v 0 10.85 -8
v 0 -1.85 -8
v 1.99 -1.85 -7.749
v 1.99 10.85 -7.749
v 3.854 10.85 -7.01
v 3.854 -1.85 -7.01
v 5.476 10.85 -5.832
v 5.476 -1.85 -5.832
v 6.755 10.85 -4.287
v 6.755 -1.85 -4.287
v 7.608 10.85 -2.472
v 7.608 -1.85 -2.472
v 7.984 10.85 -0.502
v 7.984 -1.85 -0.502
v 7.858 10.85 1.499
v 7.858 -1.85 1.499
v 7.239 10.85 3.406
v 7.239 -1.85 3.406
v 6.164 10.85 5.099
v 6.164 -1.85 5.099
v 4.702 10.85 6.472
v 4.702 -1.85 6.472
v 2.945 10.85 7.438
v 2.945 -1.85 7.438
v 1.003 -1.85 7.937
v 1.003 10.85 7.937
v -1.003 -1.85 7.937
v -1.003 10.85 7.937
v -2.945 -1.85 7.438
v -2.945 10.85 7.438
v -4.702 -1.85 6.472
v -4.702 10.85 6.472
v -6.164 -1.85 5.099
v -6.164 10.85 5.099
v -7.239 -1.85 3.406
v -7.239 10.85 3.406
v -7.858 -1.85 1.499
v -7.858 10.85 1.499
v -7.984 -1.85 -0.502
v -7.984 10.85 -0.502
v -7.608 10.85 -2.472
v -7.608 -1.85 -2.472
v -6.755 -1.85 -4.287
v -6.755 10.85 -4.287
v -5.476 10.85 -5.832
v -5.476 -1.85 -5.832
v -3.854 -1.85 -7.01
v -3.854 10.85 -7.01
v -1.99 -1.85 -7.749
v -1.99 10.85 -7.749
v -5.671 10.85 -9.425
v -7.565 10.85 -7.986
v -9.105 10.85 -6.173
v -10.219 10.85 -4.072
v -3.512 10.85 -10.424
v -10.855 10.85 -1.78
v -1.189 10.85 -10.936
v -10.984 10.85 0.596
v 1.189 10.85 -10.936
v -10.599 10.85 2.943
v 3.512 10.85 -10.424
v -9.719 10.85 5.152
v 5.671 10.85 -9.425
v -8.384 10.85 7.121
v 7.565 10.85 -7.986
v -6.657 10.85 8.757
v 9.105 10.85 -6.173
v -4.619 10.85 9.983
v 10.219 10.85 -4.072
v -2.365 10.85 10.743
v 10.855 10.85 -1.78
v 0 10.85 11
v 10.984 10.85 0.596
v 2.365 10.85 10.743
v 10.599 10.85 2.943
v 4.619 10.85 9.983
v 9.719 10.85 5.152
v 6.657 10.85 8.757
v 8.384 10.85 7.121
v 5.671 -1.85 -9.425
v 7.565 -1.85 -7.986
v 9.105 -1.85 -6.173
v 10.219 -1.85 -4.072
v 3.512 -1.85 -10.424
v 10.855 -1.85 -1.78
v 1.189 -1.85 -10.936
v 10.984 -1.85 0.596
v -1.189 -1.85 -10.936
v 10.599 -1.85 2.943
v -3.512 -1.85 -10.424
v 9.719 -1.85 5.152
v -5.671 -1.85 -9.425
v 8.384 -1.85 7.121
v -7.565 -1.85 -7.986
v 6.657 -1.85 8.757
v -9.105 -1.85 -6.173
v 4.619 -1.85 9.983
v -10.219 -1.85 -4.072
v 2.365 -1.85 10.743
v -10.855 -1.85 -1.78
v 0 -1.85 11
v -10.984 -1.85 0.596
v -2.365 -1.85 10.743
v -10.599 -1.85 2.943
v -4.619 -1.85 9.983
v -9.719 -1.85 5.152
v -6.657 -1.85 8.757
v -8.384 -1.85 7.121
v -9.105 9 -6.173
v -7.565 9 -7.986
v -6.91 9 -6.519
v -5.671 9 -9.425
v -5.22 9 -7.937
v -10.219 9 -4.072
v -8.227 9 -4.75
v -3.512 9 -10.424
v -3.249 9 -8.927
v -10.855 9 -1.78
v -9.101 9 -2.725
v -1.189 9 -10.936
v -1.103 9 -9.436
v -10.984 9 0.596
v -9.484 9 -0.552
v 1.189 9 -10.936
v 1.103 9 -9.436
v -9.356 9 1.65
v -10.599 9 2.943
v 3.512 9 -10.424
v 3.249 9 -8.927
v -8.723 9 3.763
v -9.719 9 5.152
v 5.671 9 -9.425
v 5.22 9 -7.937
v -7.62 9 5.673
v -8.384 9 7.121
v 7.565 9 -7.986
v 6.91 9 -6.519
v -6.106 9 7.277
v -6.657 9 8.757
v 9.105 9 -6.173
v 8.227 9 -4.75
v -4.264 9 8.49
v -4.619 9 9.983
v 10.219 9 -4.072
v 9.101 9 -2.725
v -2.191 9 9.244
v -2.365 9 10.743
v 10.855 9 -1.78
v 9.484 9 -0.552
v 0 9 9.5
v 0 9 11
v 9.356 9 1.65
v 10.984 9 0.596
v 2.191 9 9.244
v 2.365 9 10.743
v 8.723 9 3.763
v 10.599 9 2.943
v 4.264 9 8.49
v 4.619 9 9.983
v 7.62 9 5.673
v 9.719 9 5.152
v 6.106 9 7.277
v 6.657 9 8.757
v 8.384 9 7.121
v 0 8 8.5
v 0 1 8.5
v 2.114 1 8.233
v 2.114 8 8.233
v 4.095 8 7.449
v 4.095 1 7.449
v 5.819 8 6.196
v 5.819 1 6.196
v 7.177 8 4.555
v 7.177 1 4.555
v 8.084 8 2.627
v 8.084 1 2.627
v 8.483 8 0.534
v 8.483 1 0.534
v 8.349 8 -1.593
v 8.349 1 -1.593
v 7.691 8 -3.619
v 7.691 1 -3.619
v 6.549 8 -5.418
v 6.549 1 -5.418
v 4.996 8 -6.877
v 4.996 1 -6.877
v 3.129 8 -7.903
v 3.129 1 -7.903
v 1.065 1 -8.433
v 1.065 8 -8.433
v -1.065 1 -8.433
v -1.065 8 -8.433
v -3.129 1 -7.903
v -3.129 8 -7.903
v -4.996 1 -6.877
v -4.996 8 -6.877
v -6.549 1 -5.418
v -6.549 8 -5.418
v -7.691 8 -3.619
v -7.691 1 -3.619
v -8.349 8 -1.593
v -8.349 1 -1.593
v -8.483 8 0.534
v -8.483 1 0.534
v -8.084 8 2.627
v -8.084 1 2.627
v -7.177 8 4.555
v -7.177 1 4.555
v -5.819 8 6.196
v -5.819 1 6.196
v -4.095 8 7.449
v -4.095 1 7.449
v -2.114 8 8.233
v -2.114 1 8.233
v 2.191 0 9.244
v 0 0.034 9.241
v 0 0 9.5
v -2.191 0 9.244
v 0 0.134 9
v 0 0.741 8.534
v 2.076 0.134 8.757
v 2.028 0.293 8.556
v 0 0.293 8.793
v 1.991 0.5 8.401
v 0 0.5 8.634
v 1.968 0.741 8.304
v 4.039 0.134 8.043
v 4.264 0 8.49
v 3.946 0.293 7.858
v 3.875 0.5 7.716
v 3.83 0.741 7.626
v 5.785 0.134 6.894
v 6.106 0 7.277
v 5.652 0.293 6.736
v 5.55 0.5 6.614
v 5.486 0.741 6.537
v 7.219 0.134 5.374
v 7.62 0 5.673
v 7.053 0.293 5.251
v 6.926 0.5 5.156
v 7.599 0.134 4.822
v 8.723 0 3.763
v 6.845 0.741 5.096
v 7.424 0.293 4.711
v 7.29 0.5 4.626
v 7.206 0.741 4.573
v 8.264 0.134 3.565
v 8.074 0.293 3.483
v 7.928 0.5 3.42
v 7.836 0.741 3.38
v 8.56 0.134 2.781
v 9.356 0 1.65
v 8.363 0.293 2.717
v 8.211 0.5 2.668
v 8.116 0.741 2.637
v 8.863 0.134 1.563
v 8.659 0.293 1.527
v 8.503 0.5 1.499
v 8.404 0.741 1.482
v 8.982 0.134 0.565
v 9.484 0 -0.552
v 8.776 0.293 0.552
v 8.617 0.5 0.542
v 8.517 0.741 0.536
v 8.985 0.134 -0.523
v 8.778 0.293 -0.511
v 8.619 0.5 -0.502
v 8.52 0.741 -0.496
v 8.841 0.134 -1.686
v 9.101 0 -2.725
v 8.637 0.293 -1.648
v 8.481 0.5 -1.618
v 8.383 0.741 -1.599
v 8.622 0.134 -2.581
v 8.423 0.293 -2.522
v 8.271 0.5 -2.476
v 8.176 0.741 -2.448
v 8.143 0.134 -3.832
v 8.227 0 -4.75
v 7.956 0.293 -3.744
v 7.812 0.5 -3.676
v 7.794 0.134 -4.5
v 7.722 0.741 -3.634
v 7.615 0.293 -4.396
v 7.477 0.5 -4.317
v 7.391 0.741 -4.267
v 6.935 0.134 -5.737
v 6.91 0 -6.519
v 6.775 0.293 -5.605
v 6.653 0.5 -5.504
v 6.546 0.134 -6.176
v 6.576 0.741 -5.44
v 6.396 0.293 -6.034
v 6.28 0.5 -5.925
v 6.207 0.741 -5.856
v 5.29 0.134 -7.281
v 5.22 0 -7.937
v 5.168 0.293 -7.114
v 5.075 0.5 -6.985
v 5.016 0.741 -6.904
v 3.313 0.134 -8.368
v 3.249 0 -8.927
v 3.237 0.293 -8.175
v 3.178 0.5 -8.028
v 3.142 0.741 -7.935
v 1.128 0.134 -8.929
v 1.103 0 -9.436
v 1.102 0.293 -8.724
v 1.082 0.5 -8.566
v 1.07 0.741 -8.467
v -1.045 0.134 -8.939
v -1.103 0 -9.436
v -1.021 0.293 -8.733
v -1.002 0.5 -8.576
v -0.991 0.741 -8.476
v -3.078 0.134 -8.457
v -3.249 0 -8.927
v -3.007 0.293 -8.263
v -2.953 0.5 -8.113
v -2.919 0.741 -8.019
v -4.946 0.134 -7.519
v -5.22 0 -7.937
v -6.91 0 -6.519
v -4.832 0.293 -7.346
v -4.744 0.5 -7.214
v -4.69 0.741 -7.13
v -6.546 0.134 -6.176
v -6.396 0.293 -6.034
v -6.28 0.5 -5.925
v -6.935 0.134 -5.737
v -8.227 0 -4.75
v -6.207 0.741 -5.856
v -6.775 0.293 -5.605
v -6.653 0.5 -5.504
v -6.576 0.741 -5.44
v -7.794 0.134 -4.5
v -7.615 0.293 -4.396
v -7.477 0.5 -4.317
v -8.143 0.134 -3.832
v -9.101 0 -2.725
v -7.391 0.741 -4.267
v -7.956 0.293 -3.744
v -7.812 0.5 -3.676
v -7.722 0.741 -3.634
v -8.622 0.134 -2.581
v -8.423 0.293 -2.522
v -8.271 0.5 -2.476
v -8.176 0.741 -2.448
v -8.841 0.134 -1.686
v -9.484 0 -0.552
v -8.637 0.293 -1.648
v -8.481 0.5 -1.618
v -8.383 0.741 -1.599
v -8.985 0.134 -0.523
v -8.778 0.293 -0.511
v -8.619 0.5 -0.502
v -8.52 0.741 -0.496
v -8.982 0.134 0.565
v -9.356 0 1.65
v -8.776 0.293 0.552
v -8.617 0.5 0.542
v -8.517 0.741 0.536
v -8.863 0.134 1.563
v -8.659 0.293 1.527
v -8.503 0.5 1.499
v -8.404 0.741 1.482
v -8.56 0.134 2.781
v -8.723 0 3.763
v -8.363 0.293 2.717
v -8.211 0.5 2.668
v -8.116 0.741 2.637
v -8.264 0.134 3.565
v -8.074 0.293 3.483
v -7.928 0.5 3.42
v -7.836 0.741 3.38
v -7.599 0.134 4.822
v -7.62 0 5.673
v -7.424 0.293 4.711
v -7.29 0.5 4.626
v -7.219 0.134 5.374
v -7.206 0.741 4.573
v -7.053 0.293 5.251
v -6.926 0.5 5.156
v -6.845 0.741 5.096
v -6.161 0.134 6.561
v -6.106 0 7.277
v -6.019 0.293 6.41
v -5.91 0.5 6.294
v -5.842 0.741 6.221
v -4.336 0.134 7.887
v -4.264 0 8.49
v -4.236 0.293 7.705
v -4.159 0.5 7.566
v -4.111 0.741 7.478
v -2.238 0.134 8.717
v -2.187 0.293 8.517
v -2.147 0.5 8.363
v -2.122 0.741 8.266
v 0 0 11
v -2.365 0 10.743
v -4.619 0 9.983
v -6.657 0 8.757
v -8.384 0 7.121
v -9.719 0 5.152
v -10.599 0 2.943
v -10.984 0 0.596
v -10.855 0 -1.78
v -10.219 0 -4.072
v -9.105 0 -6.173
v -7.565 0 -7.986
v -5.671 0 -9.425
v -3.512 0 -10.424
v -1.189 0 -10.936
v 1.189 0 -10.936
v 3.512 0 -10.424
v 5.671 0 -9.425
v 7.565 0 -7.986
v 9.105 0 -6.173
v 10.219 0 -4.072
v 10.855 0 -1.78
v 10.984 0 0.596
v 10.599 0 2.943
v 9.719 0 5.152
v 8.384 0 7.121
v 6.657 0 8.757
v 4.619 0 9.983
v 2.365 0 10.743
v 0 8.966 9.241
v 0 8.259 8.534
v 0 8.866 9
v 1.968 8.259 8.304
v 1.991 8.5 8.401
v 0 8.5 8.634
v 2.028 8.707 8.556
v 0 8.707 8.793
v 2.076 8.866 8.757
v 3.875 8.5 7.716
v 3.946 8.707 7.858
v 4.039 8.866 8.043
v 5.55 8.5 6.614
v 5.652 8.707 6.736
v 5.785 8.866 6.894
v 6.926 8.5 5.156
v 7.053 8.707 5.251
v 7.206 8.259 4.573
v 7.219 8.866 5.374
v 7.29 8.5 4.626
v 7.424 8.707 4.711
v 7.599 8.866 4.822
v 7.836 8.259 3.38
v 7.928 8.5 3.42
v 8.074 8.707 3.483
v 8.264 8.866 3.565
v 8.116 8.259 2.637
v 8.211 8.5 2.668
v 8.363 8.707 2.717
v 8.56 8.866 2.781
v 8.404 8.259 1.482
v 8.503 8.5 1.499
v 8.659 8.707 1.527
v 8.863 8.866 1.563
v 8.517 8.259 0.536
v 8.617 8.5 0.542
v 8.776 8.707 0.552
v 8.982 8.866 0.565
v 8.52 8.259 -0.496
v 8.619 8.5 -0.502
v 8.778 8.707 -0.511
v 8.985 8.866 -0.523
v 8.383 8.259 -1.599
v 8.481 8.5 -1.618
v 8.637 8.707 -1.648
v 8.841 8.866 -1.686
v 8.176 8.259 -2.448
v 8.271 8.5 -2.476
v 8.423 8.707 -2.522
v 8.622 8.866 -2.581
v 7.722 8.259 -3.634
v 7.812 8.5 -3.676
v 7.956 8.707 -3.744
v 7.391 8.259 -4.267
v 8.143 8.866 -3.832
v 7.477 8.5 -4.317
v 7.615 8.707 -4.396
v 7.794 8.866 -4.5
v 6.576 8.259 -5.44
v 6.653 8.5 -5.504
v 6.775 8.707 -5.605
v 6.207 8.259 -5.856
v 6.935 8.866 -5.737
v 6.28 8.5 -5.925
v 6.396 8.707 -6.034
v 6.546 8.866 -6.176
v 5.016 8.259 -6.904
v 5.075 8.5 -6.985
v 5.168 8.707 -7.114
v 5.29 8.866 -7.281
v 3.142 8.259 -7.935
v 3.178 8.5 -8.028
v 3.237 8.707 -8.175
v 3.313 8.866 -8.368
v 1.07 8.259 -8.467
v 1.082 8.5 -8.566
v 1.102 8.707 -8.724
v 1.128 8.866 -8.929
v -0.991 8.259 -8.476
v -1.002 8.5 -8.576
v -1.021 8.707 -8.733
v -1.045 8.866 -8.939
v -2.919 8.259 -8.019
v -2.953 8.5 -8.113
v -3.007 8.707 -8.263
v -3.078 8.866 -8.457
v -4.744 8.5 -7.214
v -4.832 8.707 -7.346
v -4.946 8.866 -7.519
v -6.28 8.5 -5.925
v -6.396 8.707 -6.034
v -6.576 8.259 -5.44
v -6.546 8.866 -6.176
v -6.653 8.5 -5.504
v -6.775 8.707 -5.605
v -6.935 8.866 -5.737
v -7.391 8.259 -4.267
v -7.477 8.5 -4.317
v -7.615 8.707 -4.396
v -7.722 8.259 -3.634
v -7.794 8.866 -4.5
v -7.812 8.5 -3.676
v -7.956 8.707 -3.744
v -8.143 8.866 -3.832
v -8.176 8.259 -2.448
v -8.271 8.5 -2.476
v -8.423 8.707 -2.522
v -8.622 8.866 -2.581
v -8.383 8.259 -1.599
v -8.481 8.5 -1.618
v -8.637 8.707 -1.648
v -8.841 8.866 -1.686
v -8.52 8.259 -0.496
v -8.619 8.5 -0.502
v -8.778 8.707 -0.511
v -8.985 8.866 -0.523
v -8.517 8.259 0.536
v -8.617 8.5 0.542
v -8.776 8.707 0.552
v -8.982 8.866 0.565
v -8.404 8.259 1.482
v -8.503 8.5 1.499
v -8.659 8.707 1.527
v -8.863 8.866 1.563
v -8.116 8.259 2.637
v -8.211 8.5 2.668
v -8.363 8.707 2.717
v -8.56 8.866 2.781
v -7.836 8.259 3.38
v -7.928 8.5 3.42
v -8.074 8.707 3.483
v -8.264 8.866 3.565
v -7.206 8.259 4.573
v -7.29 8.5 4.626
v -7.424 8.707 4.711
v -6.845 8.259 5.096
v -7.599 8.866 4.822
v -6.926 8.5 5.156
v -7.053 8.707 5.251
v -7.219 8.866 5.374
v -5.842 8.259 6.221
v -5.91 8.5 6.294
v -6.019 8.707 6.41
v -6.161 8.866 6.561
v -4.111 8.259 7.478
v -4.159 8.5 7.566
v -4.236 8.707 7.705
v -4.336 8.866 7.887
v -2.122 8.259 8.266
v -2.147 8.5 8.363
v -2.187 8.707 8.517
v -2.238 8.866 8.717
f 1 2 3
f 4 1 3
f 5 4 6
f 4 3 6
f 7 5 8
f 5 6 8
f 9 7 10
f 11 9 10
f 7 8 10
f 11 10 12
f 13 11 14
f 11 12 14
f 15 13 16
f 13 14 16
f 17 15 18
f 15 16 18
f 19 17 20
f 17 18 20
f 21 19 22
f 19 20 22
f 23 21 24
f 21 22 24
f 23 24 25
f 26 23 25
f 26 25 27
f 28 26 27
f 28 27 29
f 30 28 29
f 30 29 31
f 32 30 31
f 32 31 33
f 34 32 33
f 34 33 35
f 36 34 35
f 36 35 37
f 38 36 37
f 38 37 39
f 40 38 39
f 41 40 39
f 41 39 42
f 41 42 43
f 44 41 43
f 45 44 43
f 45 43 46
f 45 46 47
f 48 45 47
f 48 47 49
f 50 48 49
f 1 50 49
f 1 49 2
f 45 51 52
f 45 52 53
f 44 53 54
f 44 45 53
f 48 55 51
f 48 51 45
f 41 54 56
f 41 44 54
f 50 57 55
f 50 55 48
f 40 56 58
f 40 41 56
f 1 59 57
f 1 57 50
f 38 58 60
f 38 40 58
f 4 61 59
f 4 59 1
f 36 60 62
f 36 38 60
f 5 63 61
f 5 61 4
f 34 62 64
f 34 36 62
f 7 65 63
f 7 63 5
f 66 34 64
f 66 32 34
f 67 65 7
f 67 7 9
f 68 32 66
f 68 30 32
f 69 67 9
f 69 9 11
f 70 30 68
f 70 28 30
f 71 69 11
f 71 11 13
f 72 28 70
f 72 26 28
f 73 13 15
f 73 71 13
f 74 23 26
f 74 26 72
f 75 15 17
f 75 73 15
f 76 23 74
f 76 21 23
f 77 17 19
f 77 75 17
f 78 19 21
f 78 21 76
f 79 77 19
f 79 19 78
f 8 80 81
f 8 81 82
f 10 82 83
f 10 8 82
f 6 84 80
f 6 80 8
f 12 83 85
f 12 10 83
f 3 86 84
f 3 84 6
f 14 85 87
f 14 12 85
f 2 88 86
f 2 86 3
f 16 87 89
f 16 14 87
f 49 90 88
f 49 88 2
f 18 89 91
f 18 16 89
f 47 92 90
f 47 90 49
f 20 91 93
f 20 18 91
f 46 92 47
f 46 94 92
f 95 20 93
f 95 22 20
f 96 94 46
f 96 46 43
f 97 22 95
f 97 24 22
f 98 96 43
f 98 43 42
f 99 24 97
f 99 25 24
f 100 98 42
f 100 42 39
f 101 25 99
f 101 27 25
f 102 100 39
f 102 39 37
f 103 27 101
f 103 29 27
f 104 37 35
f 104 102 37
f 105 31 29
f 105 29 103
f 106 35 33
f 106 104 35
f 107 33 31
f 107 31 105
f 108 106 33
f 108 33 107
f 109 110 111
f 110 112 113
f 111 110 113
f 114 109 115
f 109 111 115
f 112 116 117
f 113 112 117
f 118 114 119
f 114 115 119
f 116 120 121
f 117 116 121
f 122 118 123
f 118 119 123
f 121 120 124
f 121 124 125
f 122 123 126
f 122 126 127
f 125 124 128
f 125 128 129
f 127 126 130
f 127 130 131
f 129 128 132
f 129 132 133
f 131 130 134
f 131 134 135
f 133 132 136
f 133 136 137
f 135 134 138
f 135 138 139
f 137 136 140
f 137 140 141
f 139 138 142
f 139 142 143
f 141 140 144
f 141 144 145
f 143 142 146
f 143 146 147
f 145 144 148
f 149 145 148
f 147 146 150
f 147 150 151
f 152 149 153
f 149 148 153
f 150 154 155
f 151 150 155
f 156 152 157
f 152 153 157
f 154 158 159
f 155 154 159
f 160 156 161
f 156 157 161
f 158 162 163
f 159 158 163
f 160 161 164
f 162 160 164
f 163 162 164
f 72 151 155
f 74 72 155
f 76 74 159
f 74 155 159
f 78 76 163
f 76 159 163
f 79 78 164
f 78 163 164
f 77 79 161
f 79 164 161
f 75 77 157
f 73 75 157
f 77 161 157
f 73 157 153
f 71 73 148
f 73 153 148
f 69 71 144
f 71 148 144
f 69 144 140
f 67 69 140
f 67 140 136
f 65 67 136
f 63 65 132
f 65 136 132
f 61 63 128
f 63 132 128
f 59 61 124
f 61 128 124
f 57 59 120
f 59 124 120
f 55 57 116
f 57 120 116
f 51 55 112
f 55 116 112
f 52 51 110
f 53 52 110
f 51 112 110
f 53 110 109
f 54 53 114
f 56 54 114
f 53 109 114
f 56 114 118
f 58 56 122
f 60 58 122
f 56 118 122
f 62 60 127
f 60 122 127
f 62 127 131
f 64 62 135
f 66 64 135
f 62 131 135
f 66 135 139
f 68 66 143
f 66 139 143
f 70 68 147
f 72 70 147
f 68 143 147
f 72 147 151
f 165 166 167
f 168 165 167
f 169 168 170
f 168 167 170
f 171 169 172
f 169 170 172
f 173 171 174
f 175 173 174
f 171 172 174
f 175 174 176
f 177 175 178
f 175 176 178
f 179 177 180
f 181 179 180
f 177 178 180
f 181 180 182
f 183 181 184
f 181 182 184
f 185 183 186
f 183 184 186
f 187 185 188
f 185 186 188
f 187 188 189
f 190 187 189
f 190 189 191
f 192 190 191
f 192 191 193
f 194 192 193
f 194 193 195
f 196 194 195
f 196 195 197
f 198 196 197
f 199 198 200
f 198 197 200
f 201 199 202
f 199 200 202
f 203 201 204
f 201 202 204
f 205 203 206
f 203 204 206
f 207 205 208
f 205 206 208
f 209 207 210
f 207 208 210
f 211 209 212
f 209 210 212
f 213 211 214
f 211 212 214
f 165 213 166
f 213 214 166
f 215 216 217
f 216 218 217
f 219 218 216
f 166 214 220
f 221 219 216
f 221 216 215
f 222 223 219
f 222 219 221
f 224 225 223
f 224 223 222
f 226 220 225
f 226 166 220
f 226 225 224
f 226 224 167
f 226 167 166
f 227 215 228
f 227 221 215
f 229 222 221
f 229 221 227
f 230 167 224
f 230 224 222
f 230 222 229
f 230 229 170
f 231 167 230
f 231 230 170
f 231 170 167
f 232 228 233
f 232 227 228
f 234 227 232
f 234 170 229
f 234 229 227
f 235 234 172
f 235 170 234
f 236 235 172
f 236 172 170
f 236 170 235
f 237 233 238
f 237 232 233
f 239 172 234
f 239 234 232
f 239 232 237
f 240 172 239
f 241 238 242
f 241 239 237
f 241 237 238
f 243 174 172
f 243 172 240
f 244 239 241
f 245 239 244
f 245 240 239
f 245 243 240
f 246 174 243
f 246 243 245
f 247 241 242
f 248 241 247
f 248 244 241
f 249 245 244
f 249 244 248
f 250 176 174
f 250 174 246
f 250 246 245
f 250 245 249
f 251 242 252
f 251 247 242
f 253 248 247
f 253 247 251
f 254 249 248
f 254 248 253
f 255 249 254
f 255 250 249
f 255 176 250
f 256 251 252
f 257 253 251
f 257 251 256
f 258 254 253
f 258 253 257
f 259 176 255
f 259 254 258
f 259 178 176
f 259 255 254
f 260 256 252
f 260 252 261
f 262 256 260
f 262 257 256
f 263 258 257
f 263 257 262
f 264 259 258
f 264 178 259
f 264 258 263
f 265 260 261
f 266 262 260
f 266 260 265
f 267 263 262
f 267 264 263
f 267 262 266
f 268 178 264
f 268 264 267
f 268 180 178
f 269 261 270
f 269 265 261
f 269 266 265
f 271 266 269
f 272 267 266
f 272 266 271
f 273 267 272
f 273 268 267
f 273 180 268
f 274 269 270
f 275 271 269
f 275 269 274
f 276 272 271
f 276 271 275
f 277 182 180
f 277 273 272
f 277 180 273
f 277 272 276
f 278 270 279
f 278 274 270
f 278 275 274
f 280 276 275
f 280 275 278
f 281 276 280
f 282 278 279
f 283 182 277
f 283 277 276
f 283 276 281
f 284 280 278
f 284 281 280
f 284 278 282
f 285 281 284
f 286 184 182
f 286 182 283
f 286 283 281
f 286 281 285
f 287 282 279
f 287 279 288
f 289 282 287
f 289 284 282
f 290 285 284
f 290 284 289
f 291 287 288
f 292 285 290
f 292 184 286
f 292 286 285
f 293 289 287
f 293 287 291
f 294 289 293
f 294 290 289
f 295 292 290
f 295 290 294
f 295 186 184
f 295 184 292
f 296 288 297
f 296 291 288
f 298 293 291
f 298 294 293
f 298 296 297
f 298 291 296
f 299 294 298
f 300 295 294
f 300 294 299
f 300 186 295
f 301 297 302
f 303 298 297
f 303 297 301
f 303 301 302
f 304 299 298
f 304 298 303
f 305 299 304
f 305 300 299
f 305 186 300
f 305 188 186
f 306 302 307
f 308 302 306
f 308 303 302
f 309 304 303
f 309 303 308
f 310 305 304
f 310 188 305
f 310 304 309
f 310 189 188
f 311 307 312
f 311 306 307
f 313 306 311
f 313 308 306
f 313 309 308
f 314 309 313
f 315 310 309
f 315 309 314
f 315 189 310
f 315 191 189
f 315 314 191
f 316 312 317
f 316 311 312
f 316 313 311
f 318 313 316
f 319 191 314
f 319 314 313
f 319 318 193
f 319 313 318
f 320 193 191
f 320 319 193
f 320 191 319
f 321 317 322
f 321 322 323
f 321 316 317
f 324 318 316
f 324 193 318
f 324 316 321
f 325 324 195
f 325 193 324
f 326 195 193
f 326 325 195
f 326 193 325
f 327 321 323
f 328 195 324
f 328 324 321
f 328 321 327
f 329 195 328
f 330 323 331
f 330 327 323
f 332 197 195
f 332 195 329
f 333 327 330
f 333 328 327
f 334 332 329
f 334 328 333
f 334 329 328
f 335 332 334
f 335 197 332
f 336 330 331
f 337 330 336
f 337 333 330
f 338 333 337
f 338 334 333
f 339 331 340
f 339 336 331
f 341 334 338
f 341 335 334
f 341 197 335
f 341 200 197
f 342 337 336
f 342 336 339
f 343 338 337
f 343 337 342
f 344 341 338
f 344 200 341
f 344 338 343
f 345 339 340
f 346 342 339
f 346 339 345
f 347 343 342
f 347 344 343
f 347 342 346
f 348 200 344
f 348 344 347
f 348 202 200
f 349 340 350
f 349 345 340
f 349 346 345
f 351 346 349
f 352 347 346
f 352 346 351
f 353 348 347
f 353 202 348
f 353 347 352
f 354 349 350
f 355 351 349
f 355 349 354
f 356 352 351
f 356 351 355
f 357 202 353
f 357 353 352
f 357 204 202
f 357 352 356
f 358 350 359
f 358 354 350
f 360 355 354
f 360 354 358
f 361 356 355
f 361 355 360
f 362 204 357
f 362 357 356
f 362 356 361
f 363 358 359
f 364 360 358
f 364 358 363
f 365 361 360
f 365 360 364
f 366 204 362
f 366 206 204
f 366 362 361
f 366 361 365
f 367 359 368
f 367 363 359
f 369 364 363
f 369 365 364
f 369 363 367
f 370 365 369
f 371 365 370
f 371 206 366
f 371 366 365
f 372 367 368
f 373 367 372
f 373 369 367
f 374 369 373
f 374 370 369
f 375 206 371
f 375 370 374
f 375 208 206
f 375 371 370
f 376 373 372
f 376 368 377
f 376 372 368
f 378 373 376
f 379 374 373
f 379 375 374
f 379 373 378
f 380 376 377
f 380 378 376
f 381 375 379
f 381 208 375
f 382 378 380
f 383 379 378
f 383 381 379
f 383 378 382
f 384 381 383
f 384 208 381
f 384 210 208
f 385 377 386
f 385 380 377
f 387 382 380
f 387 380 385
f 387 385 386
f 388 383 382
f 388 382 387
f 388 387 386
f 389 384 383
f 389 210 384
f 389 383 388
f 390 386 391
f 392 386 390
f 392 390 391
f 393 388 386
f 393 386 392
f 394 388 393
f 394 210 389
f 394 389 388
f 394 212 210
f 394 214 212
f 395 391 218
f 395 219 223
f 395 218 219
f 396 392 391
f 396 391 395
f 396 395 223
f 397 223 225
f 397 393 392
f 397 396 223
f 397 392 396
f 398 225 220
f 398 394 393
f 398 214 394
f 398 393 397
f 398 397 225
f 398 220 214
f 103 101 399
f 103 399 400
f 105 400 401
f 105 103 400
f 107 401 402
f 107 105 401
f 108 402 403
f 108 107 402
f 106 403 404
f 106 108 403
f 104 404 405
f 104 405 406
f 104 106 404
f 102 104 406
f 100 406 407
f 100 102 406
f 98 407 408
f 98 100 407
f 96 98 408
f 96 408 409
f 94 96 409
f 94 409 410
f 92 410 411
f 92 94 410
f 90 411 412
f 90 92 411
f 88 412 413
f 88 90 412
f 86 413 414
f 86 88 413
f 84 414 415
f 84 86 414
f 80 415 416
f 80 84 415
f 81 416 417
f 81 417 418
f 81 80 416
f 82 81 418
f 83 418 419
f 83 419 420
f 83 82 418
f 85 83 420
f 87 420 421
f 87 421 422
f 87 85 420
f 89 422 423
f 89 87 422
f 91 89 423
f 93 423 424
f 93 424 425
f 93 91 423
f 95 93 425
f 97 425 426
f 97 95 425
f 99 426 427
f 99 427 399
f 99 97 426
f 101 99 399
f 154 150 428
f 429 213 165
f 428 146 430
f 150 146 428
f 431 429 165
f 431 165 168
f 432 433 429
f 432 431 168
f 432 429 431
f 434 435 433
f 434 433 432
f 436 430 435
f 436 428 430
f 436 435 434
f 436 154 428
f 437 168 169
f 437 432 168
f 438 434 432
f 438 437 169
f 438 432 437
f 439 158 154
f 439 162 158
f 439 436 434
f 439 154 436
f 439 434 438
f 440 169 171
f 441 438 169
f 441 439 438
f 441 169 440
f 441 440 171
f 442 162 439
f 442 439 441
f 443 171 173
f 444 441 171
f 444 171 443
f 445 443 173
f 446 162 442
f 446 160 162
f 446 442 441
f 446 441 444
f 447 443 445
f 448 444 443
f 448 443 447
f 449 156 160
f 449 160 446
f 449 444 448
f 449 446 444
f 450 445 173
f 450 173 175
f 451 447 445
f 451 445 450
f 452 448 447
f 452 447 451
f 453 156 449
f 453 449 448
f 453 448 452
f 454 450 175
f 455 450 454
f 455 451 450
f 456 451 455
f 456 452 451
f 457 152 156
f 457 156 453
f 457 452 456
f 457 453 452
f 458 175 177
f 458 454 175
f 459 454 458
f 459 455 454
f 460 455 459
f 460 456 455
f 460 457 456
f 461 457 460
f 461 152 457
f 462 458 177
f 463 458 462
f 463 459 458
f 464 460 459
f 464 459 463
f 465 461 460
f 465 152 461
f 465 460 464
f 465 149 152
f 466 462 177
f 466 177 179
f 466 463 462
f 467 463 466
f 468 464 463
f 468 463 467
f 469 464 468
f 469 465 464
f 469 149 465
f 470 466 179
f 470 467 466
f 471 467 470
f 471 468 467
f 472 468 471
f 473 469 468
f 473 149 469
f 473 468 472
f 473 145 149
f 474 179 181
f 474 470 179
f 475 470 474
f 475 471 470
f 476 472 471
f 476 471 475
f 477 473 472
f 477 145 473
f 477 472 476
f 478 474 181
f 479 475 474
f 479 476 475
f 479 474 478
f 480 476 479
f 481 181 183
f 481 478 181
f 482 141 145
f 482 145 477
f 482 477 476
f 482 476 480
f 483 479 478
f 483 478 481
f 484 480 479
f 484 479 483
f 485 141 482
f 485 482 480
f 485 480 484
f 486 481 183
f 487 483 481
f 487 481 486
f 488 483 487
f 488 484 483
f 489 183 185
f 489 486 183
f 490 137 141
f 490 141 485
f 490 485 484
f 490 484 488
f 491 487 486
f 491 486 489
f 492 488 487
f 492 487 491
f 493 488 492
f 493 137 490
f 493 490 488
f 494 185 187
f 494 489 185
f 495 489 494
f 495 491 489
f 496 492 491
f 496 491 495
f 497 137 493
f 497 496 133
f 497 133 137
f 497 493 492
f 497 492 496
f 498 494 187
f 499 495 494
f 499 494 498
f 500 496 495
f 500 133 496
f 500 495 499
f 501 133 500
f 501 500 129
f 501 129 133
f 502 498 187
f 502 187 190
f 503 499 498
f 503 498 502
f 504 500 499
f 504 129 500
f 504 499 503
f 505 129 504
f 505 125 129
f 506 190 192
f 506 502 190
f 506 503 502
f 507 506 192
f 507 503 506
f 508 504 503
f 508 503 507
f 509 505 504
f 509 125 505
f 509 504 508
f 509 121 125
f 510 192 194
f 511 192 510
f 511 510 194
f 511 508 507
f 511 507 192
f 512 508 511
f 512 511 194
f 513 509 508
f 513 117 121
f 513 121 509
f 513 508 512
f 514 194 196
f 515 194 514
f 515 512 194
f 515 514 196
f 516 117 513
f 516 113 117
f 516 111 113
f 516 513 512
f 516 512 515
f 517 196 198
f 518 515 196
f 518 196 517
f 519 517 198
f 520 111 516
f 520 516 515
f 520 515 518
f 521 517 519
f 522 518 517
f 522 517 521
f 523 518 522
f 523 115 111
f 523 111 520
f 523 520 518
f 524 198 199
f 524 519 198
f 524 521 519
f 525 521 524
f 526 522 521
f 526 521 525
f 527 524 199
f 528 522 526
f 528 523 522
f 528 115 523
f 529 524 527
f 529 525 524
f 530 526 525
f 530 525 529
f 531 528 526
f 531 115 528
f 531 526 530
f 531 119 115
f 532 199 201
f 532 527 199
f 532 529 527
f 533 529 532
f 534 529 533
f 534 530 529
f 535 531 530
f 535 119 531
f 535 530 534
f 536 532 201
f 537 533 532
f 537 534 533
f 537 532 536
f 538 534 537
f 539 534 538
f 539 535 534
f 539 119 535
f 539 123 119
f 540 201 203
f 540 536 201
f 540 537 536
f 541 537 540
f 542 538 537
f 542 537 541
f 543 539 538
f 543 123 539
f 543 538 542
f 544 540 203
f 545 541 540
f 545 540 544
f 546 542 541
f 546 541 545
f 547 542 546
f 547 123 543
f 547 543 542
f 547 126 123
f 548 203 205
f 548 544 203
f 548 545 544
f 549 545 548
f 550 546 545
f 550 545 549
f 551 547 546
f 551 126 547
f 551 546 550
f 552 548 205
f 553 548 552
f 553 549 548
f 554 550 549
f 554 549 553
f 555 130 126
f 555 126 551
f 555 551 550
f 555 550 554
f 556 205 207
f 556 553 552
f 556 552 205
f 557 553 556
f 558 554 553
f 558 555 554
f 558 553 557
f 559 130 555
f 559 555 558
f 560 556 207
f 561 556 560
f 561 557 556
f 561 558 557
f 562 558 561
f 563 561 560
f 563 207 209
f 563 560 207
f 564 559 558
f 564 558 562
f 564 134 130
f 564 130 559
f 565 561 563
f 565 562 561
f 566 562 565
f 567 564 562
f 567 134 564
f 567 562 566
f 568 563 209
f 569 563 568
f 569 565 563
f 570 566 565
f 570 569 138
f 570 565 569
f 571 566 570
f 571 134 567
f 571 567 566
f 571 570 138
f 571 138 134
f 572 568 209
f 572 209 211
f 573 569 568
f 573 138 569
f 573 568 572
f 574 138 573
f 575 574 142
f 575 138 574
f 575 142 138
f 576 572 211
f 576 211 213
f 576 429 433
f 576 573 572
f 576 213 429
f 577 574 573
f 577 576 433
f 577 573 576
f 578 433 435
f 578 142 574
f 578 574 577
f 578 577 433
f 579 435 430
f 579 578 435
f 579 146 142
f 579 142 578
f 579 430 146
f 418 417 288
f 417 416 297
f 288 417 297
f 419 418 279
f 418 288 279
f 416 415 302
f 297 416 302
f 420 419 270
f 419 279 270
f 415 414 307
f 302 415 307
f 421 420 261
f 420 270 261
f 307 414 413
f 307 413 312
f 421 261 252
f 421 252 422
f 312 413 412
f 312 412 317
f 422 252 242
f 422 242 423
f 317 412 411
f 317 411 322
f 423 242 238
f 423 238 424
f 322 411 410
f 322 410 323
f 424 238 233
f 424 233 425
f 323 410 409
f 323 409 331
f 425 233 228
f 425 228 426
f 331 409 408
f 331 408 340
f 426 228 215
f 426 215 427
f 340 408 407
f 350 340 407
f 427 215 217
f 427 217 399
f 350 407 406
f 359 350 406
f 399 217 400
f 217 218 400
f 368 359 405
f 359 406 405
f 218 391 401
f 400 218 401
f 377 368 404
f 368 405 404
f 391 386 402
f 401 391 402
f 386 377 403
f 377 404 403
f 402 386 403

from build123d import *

# Parameters (mm, degrees)
SKETCH1_R           = 8.5
BOSS_EXTRUDE1_DEPTH = 9
SKETCH2_R           = 11
BOSS_EXTRUDE2_DEPTH = 1.85
BOSS_EXTRUDE4_START = 1.85
SKETCH4_R           = 11
BOSS_EXTRUDE4_DEPTH = 1.85
SKETCH5_R           = 8
CUT_EXTRUDE1_DEPTH  = 21.082081565
FILLET1_R           = 1


with BuildPart() as part:
    # Sketch1 → Boss-Extrude1 (new body)
    with BuildSketch(Plane(origin=(0, 0, 0), x_dir=(1, 0, 0), z_dir=(0, 1, 0))):
        with Locations(Location((0, 0, 0), (0, 0, 270))):
            Circle(SKETCH1_R)
    extrude(amount=BOSS_EXTRUDE1_DEPTH)

    # Sketch2 → Boss-Extrude2 (add)
    with BuildSketch(Plane(origin=(0, 9, 0), x_dir=(1, 0, 0), z_dir=(0, 1, 0))):
        with Locations(Location((0, 0, 0), (0, 0, 270))):
            Circle(SKETCH2_R)
    extrude(amount=BOSS_EXTRUDE2_DEPTH)

    # Sketch4 → Boss-Extrude4 (add)
    with BuildSketch(Plane.XZ.offset(BOSS_EXTRUDE4_START)):
        with Locations(Location((0, 0, 0), (0, 0, 90))):
            Circle(SKETCH4_R)
    extrude(amount=-BOSS_EXTRUDE4_DEPTH)

    # Sketch5 → Cut-Extrude1 (cut, through all)
    with BuildSketch(Plane.XZ.offset(1.85)):
        with Locations(Location((0, 0, 0), (0, 0, 270))):
            Circle(SKETCH5_R)
    extrude(amount=-CUT_EXTRUDE1_DEPTH, mode=Mode.SUBTRACT)

    # Fillet1
    fillet1_edges = [part.edges().sort_by_distance(p)[0] for p in [
        (0, 0, -8.5),
        (0, 9, -8.5),
    ]]
    fillet(fillet1_edges, radius=FILLET1_R)


solid = part.part
